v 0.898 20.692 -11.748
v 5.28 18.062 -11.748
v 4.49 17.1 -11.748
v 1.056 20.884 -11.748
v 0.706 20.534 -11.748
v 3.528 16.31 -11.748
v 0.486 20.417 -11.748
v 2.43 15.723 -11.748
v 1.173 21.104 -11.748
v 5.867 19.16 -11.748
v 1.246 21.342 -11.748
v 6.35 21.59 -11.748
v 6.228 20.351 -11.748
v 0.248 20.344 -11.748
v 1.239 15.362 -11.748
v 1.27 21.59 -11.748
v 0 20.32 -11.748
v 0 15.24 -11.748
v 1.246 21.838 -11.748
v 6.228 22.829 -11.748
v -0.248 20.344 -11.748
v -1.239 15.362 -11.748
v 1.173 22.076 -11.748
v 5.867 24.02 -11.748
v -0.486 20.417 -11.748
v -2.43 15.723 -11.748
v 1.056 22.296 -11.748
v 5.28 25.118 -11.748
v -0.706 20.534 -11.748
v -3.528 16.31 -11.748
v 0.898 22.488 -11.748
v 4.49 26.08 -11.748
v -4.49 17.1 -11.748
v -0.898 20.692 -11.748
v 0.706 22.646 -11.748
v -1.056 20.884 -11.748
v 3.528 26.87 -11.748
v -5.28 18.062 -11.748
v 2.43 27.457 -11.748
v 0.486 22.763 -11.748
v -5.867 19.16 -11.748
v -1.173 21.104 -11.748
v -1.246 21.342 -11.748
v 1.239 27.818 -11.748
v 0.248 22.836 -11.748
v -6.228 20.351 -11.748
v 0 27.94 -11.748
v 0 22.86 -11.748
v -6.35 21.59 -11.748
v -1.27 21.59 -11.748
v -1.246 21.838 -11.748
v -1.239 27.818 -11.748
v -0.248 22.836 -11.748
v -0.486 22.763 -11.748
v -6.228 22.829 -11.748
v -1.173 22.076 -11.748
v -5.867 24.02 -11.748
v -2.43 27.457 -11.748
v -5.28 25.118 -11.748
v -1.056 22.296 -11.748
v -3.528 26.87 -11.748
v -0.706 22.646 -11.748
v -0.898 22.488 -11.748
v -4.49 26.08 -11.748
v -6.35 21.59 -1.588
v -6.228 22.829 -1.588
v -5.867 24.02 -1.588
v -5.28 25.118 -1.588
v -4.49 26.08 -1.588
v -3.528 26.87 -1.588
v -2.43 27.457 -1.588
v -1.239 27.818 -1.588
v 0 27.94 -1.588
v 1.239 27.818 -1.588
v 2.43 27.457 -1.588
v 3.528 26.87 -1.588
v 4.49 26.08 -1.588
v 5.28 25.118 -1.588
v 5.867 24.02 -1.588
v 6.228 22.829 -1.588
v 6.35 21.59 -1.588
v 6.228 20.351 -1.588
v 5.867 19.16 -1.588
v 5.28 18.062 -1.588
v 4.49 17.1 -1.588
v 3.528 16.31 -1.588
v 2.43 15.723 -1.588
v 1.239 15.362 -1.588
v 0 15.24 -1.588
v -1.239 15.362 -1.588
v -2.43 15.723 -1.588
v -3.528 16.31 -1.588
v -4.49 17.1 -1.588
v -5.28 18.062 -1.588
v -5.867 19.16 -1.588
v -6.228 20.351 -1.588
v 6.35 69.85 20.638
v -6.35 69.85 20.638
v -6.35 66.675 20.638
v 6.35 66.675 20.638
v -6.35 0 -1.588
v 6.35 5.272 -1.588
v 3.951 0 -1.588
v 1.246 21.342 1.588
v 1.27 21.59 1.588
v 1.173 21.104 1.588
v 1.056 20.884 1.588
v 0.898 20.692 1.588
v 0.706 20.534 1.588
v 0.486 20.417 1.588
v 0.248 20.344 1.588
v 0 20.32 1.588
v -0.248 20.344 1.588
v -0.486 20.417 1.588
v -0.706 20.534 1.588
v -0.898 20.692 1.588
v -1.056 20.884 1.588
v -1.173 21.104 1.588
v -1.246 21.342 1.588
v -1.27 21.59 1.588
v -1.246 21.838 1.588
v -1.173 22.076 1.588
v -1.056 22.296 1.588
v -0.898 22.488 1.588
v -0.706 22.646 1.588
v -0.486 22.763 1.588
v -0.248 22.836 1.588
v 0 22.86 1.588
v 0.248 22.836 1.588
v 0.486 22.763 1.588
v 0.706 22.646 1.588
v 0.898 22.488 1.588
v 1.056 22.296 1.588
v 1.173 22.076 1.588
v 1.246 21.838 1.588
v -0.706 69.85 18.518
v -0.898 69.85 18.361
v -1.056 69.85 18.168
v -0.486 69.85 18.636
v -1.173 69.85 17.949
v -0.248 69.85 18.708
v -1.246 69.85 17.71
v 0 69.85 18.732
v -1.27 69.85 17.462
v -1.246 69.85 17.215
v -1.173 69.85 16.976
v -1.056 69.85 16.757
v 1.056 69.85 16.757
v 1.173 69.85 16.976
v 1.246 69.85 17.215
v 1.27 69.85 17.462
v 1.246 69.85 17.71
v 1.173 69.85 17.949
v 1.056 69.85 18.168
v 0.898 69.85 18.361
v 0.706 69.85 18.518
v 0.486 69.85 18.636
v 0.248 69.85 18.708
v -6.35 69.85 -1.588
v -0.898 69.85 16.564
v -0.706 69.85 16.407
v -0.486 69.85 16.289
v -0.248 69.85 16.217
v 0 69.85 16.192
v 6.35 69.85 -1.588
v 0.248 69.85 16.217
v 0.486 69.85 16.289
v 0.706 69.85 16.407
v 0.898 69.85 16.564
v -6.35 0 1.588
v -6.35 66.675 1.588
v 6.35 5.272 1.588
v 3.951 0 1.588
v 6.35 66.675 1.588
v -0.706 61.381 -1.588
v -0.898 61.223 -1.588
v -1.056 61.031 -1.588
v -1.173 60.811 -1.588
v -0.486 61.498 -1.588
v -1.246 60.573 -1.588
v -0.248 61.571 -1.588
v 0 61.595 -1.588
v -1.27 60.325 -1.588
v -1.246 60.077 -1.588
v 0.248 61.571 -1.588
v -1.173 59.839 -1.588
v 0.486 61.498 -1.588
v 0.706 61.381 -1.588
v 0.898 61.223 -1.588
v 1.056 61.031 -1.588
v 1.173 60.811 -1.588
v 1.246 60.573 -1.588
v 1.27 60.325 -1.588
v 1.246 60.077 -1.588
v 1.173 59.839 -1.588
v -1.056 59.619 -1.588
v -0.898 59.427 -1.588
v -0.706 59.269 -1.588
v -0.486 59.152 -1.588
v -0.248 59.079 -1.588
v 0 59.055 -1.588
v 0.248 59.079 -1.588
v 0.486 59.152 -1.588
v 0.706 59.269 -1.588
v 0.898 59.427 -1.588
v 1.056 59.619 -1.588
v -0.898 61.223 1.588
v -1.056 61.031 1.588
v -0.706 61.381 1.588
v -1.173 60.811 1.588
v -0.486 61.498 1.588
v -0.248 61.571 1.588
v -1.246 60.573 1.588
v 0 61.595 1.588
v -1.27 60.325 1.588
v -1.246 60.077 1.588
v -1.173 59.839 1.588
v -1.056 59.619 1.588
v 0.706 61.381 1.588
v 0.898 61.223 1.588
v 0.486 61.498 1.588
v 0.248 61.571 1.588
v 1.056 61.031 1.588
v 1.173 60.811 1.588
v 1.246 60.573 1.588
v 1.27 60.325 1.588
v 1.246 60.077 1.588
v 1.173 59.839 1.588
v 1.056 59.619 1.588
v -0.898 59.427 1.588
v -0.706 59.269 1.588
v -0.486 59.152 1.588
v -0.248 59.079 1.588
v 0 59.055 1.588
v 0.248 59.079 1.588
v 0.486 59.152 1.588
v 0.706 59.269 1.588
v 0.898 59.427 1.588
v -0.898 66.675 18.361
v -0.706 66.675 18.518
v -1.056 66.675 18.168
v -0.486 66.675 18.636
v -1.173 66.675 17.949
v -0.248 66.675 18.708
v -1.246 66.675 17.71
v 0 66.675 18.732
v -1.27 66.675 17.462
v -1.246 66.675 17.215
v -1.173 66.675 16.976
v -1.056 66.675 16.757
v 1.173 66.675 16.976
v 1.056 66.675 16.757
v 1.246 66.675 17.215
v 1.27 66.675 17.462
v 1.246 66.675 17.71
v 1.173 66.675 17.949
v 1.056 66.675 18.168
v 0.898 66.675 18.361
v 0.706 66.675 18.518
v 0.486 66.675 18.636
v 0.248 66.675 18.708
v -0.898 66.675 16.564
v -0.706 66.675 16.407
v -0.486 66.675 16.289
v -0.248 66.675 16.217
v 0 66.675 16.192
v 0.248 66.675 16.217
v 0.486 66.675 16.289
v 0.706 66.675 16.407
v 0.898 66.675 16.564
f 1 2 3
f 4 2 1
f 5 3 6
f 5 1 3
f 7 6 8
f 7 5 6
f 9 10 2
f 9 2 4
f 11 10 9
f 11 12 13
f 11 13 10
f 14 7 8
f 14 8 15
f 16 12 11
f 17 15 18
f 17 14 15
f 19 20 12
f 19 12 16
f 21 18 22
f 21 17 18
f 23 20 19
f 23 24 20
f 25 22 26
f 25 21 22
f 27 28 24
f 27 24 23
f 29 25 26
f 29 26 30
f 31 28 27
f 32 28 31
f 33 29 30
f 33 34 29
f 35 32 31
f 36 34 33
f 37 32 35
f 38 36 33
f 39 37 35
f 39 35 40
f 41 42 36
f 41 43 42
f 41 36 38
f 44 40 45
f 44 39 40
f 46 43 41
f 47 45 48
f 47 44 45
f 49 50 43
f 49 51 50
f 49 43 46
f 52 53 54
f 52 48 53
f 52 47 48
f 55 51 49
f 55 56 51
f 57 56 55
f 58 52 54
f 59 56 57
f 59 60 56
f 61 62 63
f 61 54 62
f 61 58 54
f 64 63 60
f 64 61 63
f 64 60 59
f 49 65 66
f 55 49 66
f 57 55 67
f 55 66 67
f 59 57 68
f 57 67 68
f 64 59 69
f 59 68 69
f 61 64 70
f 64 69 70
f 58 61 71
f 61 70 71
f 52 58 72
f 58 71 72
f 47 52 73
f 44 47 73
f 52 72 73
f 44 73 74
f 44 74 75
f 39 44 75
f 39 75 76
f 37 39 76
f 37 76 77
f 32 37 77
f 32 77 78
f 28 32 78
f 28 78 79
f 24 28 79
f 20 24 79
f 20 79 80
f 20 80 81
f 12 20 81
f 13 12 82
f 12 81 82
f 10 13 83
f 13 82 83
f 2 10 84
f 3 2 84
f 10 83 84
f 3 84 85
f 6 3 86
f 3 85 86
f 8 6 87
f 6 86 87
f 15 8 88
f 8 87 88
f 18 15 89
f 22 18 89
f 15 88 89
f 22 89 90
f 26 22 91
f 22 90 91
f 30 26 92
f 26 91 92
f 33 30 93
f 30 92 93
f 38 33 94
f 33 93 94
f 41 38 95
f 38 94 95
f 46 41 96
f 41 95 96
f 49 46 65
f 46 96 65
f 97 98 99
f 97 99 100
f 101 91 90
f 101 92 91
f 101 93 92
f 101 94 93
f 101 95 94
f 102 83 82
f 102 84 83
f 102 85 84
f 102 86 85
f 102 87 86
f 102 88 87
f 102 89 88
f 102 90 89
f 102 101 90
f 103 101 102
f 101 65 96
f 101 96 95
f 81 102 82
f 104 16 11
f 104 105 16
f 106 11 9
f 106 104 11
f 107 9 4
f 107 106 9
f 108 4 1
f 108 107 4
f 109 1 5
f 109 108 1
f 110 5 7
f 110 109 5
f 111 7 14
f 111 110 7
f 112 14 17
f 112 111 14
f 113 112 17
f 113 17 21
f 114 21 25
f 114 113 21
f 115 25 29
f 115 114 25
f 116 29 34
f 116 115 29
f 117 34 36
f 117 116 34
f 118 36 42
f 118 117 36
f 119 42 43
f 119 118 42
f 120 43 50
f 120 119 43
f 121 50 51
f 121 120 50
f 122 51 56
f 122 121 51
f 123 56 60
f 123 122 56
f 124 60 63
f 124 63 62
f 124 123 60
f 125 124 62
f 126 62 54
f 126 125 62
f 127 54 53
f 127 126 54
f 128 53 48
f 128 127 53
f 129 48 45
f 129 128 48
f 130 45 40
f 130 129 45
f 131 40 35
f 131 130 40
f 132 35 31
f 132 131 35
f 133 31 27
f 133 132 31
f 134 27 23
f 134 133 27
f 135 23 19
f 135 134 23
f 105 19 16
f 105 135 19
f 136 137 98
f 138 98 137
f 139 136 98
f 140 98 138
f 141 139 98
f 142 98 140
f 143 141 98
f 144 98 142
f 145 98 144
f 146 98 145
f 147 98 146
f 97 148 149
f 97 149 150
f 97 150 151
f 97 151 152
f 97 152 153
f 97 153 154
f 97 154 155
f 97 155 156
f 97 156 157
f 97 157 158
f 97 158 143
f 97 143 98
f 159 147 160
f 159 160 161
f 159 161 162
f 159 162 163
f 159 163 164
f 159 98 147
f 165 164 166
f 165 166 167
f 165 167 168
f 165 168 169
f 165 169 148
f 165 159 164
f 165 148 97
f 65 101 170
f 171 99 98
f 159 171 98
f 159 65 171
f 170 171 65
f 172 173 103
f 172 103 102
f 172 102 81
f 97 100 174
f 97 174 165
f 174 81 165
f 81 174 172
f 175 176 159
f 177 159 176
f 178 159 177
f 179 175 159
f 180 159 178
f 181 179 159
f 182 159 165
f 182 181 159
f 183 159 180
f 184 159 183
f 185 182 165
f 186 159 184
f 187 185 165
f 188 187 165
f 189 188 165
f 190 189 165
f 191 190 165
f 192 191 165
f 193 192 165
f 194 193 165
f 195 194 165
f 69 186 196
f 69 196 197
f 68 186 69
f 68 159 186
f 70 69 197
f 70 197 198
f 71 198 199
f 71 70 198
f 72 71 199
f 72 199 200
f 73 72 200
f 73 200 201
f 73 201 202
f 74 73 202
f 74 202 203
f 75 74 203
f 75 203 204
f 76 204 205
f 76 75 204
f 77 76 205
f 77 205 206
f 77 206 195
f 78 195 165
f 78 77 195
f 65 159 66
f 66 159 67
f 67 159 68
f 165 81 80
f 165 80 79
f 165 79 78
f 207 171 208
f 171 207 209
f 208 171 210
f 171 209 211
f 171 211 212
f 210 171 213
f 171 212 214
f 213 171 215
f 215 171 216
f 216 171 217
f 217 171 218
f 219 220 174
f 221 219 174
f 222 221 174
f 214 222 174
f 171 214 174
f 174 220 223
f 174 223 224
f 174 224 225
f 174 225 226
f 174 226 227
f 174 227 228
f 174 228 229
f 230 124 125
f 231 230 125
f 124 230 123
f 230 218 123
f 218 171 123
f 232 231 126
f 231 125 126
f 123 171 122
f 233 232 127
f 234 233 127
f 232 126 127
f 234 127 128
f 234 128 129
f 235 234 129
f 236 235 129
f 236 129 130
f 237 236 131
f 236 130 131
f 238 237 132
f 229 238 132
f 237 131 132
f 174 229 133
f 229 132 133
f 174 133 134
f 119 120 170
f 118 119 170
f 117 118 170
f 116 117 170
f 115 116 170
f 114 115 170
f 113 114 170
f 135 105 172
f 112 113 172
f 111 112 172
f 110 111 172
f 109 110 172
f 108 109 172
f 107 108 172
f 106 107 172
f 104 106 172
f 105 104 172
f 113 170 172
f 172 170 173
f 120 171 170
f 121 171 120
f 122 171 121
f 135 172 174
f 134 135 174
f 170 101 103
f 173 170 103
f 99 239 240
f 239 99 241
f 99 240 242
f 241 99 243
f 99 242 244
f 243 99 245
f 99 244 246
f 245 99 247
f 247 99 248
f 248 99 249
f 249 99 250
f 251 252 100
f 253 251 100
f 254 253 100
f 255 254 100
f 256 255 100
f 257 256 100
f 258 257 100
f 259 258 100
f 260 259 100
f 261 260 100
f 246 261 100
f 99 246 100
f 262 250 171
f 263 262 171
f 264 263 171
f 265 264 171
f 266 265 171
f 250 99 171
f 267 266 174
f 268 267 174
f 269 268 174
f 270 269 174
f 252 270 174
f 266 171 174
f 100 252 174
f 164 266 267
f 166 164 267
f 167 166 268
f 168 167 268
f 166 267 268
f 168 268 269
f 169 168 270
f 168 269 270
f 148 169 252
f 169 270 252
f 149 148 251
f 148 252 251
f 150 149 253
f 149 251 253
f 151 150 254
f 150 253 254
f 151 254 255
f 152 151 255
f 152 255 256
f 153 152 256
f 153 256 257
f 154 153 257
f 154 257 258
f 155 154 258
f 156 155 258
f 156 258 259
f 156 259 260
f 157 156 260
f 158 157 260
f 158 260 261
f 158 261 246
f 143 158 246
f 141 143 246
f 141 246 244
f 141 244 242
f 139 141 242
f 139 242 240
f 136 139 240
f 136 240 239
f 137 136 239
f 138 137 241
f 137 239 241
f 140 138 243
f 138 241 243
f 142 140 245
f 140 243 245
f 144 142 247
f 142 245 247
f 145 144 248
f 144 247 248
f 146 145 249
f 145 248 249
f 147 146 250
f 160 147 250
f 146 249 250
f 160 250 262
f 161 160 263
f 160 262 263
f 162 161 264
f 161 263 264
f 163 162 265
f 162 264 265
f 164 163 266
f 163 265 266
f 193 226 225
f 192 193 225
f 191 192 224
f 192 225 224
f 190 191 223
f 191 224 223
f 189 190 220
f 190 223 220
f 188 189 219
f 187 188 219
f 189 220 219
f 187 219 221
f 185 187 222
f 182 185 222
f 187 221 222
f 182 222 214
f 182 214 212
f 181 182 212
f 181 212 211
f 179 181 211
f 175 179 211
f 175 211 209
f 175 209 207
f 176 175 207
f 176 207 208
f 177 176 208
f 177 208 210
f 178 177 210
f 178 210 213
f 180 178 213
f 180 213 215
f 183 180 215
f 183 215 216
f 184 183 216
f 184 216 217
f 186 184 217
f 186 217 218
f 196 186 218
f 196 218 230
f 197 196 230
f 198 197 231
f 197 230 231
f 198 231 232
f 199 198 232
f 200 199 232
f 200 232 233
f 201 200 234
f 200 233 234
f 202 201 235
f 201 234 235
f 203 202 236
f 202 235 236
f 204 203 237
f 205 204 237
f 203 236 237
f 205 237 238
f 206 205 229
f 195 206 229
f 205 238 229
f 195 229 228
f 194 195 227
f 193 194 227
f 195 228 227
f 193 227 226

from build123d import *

# Parameters (mm, degrees)
SKETCH1_W           = 12.7
SKETCH1_H           = 3.175
BOSS_EXTRUDE1_DEPTH = 69.85
SKETCH2_W           = 12.7
SKETCH2_H           = 3.175
BOSS_EXTRUDE2_DEPTH = 19.05
SKETCH3_R           = 1.27
CUT_EXTRUDE1_DEPTH  = 71.084124673
SKETCH4_R           = 1.27
CUT_EXTRUDE2_DEPTH  = 73.679071953
SKETCH5_R           = 6.35
SKETCH5_R_2         = 1.27
BOSS_EXTRUDE3_DEPTH = 10.16
CUT_EXTRUDE3_DEPTH  = 73.679071953


with BuildPart() as part:
    # Sketch1 → Boss-Extrude1 (new body)
    with BuildSketch(Plane(origin=(0, 0, 0), x_dir=(1, 0, 0), z_dir=(0, 1, 0))):
        Rectangle(SKETCH1_W, SKETCH1_H)
    extrude(amount=BOSS_EXTRUDE1_DEPTH)

    # Sketch2 → Boss-Extrude2 (add)
    with BuildSketch(Plane.XY.offset(1.5875)):
        with Locations((0, 68.2625)):
            Rectangle(SKETCH2_W, SKETCH2_H)
    extrude(amount=BOSS_EXTRUDE2_DEPTH)

    # Sketch3 → Cut-Extrude1 (cut, through all)
    with BuildSketch(Plane.XZ.offset(-66.675)):
        with Locations(Location((0, 17.4625, 0), (0, 0, 270))):
            Circle(SKETCH3_R)
    extrude(amount=-CUT_EXTRUDE1_DEPTH, mode=Mode.SUBTRACT)

    # Sketch4 → Cut-Extrude2 (cut, through all)
    with BuildSketch(Plane.XY.offset(1.5875)):
        with Locations((0, 21.59)):
            Circle(SKETCH4_R)
        with Locations((0, 60.325)):
            Circle(SKETCH4_R)
    extrude(amount=-CUT_EXTRUDE2_DEPTH, mode=Mode.SUBTRACT)

    # Sketch5 → Boss-Extrude3 (add)
    with BuildSketch(Plane(origin=(0, 0, -1.5875), x_dir=(-1, 0, 0), z_dir=(0, 0, -1))):
        with Locations((0, 21.59)):
            Circle(SKETCH5_R)
        with Locations(Location((0, 21.59, 0), (0, 0, 180))):
            Circle(SKETCH5_R_2, mode=Mode.SUBTRACT)
    extrude(amount=BOSS_EXTRUDE3_DEPTH)

    # Sketch6 → Cut-Extrude3 (cut, through all)
    with BuildSketch(Plane.XY.offset(1.5875)):
        Polygon((3.951482723, 0), (6.35, 5.27166953), (6.35, 0), align=None)
    extrude(amount=-CUT_EXTRUDE3_DEPTH, mode=Mode.SUBTRACT)


solid = part.part
